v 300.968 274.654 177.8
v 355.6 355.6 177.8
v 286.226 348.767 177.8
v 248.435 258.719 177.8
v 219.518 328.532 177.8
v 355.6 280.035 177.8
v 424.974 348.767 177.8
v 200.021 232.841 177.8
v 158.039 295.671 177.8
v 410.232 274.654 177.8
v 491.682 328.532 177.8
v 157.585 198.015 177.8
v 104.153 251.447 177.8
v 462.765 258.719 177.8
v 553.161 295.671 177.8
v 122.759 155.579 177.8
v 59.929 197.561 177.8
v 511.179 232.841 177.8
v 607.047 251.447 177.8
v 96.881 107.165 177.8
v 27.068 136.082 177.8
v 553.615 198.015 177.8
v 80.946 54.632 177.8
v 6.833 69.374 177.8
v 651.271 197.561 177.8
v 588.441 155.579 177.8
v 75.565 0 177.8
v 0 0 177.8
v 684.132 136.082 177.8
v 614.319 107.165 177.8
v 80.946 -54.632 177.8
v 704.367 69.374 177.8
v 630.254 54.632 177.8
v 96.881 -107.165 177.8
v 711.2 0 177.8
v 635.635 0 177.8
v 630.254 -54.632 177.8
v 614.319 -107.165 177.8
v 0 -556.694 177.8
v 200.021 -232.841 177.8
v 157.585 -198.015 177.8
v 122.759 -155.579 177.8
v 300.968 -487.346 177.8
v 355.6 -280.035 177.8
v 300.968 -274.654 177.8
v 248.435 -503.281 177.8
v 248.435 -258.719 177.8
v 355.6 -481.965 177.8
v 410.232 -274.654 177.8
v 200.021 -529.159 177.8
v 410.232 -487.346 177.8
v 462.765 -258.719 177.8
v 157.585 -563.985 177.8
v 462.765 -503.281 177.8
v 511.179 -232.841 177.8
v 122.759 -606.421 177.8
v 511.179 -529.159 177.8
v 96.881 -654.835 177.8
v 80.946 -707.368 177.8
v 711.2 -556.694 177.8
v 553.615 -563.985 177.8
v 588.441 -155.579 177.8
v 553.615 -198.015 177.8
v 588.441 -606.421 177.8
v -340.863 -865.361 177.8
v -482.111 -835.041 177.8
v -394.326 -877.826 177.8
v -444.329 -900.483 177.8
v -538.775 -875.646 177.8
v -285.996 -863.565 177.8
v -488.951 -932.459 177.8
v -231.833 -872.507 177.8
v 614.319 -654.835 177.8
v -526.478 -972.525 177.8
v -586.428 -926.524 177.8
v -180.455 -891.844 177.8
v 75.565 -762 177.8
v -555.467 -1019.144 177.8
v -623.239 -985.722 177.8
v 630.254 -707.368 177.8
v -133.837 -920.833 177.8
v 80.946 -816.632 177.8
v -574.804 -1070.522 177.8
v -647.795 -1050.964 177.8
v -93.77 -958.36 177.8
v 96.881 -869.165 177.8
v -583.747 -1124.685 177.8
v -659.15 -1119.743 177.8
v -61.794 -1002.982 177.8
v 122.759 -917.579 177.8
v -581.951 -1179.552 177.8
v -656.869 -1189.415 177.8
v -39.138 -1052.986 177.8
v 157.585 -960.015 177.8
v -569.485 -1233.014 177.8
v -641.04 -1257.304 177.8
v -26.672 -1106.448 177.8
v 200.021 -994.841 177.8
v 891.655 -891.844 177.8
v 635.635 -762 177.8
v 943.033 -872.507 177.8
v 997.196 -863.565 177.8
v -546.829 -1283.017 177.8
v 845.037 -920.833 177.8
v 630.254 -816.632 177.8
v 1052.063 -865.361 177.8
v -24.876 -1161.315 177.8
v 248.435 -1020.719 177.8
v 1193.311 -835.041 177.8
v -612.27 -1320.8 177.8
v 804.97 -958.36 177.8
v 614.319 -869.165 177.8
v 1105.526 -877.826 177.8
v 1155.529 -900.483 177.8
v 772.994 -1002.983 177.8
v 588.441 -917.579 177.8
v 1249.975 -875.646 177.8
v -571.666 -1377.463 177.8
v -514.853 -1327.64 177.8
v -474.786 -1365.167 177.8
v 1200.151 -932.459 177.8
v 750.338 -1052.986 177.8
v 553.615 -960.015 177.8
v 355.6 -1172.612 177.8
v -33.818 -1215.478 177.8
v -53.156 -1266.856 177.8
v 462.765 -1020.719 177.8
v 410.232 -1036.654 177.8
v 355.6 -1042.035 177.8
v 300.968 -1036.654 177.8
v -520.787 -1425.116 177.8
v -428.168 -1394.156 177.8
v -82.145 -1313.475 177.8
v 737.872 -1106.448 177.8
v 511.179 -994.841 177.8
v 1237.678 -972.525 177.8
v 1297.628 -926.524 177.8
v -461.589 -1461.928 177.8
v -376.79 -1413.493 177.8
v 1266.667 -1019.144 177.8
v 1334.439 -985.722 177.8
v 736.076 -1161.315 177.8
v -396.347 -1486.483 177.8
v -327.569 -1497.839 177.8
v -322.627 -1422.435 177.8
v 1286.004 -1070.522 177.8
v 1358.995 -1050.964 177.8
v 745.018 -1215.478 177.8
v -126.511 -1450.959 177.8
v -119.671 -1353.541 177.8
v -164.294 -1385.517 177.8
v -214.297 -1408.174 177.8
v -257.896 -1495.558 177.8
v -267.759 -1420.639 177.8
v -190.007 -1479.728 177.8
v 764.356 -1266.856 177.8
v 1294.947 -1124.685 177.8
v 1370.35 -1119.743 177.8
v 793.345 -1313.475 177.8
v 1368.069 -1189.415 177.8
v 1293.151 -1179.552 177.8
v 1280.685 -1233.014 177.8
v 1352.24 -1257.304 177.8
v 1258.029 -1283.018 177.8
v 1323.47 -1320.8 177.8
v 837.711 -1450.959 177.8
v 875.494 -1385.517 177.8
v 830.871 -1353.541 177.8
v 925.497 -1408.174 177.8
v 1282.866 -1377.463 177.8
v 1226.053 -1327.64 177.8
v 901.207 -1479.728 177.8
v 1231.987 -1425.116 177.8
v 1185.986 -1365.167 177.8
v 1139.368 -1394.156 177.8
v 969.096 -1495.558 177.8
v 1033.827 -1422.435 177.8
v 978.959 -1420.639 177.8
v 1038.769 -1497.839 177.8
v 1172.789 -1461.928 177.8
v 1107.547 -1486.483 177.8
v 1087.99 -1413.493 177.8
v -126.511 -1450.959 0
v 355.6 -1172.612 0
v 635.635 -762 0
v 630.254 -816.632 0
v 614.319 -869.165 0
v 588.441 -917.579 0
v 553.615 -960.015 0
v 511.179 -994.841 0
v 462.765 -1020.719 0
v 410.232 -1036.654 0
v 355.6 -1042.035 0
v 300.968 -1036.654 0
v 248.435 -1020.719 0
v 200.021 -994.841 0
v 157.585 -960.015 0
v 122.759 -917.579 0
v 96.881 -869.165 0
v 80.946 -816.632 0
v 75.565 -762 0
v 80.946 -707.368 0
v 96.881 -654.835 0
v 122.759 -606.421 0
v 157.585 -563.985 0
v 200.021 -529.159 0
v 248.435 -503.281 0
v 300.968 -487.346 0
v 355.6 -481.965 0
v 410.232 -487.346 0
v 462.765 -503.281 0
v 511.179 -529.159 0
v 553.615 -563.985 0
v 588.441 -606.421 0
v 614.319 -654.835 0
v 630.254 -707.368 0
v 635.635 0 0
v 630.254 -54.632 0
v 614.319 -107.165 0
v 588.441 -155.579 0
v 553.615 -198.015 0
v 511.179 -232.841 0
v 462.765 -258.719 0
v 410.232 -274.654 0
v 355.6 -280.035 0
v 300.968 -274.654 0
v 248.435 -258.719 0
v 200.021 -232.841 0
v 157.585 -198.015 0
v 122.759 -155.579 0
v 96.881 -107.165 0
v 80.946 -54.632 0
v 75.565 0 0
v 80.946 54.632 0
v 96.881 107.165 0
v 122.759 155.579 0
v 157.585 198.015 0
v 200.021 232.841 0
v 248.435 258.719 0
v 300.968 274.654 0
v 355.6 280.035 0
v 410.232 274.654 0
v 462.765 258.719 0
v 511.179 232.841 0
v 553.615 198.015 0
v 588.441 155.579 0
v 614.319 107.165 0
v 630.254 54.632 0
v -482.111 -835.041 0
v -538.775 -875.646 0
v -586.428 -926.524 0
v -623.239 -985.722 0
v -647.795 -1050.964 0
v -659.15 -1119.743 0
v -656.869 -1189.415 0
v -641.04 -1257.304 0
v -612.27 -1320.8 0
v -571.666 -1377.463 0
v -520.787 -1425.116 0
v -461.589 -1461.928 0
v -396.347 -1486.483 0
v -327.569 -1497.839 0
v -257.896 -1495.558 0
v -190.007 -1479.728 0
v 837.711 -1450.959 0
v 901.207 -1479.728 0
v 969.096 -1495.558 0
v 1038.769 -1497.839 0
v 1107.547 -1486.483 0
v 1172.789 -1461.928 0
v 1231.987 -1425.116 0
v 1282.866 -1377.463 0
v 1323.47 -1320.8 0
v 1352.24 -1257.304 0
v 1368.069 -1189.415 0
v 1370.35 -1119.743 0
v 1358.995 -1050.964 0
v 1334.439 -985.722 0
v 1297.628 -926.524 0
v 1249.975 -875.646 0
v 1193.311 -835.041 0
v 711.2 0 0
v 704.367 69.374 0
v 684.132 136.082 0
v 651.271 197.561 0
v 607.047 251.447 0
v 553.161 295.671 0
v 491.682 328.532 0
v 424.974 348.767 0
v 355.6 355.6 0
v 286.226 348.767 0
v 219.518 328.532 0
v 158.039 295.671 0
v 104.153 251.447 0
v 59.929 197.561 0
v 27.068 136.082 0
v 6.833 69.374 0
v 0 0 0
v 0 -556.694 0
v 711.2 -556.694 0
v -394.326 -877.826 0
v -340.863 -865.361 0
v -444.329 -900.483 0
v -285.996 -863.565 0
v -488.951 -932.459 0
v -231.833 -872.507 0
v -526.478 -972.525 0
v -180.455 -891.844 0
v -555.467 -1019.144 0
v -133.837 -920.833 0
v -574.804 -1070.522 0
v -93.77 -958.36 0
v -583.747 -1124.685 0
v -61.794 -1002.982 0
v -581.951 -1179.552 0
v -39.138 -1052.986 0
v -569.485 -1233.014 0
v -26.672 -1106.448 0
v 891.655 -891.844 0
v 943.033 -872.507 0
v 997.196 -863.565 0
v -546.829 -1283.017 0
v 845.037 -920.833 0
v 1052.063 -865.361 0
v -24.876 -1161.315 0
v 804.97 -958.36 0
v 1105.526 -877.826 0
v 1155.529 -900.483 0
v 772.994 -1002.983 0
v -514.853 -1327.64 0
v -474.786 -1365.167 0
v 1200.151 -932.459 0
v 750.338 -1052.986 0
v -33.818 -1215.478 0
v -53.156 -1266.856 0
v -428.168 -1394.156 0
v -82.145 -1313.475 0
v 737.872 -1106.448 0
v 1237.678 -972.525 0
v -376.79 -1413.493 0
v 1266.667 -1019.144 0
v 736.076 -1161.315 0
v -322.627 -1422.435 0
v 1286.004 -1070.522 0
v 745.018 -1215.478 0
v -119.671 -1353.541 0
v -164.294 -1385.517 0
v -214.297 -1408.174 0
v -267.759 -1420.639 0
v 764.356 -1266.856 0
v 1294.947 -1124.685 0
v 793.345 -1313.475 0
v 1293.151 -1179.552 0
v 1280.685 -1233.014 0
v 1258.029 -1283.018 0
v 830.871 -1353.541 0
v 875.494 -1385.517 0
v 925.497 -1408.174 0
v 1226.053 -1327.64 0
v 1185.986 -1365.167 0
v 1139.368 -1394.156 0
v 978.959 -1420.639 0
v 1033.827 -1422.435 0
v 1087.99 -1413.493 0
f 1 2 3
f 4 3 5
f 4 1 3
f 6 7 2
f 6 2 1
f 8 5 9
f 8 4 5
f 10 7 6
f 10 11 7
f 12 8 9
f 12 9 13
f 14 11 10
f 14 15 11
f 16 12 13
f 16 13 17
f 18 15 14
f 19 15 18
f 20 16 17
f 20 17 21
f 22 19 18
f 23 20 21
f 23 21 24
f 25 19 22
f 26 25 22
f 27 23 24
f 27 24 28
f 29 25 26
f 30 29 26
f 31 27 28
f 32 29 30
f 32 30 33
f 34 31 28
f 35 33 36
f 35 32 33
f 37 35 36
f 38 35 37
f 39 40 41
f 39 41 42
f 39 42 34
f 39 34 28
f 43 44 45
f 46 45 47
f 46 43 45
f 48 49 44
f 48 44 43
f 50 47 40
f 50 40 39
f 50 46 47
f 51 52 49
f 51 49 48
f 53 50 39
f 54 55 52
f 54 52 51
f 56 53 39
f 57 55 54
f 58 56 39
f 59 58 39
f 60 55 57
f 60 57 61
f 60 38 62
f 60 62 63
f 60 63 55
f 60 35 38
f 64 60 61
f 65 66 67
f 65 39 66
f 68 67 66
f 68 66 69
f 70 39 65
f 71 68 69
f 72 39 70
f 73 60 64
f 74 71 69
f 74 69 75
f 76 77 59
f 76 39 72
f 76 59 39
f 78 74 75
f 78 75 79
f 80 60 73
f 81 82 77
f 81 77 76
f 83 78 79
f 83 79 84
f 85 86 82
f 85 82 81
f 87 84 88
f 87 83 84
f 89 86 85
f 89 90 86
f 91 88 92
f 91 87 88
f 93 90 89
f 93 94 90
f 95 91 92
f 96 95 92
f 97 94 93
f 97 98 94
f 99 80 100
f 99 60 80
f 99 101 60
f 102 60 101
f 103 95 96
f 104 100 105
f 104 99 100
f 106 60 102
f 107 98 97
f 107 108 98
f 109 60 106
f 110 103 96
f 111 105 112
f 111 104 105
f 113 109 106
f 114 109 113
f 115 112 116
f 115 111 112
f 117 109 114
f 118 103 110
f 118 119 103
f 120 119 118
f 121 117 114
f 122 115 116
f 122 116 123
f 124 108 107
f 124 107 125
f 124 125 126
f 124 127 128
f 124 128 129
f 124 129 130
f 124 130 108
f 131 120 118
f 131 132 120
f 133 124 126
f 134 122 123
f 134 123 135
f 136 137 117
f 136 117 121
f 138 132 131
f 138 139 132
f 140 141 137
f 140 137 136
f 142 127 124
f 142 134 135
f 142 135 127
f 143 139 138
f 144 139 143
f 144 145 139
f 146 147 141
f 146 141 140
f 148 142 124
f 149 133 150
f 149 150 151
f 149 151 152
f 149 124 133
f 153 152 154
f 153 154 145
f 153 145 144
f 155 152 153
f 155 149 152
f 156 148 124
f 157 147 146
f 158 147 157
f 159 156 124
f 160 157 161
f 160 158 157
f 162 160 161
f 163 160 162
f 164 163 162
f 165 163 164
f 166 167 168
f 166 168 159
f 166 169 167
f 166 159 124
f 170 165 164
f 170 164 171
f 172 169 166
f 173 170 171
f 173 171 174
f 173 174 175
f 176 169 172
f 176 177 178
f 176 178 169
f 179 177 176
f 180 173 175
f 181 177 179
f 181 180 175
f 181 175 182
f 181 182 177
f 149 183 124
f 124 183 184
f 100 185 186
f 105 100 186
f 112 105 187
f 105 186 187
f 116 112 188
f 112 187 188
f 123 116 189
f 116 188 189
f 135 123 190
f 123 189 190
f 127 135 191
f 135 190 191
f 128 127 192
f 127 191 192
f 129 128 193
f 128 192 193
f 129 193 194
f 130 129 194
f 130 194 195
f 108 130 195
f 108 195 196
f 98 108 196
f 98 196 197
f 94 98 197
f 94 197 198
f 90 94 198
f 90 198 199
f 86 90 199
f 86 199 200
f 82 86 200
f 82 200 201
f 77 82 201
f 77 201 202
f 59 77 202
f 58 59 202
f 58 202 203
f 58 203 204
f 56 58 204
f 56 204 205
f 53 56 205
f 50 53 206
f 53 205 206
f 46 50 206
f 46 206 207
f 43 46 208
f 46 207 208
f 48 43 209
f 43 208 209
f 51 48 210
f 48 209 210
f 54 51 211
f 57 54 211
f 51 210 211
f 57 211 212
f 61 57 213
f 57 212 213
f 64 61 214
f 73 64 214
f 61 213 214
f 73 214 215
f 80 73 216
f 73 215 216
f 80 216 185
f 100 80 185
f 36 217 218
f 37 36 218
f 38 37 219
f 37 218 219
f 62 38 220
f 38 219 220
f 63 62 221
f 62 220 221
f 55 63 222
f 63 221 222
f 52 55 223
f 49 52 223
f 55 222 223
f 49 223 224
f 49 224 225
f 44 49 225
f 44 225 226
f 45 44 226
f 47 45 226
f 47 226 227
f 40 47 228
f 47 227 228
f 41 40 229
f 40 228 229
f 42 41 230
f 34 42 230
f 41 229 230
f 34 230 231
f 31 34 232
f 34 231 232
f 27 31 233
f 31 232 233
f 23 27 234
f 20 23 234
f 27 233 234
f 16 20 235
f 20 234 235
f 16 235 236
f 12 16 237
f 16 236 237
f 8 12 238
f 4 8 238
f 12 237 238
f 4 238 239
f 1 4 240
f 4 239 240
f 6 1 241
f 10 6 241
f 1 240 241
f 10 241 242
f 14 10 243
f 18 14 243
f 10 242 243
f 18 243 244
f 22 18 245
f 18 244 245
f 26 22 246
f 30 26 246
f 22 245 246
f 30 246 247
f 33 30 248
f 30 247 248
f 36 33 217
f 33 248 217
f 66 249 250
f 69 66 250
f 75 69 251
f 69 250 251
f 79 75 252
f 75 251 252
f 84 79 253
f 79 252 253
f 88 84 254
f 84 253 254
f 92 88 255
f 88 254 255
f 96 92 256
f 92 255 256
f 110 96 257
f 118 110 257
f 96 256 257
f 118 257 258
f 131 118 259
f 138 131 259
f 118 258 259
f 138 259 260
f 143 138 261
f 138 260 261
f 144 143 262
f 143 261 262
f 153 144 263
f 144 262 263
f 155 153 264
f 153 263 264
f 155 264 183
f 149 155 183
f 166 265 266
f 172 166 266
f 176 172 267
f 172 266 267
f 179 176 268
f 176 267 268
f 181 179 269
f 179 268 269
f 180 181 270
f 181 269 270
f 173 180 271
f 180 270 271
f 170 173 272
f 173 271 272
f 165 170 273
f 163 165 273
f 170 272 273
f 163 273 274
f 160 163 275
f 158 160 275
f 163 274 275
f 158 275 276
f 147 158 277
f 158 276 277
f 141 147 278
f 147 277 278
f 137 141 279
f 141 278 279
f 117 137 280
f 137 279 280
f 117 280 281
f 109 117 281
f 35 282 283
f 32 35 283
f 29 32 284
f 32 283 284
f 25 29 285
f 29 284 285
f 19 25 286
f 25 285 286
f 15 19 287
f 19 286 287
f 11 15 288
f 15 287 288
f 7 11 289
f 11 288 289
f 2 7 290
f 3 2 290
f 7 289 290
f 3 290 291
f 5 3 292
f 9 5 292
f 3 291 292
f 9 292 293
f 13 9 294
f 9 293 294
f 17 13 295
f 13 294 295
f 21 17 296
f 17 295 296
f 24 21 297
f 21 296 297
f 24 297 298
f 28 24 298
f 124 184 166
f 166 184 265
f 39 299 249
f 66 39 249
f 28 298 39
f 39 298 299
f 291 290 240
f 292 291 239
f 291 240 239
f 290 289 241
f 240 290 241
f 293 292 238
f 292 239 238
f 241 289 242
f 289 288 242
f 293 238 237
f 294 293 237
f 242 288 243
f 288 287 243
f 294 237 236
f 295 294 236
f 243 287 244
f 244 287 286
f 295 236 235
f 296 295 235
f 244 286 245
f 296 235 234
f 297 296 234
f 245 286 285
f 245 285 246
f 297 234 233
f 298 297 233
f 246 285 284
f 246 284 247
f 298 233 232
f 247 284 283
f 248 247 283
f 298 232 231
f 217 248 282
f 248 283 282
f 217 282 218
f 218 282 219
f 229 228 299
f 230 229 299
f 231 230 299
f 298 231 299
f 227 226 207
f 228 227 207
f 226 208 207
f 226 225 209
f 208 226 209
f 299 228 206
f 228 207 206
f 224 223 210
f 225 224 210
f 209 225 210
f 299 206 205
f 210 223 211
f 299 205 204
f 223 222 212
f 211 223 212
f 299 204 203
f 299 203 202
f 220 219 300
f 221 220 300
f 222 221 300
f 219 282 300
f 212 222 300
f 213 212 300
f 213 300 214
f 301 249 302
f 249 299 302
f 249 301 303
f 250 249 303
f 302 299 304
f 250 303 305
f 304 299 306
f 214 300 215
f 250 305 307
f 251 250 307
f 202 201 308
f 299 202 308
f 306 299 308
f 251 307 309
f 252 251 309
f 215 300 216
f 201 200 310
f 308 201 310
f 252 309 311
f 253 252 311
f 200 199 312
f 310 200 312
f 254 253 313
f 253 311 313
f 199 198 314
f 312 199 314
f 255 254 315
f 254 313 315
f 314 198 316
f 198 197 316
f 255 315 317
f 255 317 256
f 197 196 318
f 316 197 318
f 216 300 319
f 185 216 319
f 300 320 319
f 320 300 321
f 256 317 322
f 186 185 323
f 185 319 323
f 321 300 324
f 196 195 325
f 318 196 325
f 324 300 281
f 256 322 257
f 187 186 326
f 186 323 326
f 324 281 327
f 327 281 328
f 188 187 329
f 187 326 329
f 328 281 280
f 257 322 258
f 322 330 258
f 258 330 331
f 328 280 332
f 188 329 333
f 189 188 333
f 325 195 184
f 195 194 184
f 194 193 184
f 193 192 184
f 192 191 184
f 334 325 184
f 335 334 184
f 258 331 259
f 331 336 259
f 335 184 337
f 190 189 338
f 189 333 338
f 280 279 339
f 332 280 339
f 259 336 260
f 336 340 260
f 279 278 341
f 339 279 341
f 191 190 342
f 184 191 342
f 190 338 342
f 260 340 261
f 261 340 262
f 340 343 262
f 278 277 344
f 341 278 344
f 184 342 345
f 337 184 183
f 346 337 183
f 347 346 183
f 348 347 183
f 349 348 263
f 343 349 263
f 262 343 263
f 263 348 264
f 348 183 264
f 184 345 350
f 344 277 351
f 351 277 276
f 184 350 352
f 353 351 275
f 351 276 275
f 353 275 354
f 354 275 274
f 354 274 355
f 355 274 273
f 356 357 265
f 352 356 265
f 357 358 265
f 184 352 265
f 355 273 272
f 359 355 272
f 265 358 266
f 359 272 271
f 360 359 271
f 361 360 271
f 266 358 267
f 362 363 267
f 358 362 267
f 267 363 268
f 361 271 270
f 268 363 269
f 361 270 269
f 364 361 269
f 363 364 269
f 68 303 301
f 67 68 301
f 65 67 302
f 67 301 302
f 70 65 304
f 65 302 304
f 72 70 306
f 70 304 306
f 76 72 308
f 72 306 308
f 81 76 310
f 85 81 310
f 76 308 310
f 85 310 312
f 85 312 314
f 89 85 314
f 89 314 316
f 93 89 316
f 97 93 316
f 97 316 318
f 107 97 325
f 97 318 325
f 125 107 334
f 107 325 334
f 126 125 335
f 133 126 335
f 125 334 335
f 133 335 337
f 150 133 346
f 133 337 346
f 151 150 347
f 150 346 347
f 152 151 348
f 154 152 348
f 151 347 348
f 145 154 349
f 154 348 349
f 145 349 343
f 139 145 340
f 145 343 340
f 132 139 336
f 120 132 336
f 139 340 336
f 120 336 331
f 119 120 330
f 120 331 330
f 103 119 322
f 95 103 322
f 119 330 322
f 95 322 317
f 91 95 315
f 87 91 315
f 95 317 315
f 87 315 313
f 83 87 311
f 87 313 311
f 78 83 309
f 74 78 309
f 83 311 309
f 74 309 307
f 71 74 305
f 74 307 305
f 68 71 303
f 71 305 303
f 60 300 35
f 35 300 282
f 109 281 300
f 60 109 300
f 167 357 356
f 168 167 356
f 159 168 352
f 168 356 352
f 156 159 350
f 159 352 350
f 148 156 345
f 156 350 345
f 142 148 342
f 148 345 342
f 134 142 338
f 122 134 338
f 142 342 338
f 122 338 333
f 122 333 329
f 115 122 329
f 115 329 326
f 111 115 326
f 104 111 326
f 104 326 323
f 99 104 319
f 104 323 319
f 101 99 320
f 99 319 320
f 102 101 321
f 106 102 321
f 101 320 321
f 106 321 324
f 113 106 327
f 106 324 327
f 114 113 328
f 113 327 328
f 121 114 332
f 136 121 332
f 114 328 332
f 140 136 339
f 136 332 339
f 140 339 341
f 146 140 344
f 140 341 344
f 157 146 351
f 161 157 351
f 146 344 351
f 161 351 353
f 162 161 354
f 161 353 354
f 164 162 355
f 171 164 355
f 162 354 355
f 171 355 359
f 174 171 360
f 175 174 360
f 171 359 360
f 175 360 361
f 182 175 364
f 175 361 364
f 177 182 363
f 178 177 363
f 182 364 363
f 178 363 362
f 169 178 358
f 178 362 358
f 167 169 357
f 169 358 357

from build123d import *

# Parameters (mm, degrees)
F1_DEPTH        = 177.8
F1_COPIES_COUNT = 3


# Not quite as in the source:
# - a feature of the source that left no trace in its solid (it failed there, or was rolled back) is left out
# - a pattern or mirror of a feature is missing from the dataset's text; its kind, count and spacing are read off the source's solid


with BuildPart() as f1:
    # F0 (on Top) → F1 (new body)
    with BuildSketch(Plane.XY):
        with BuildLine():
            ThreePointArc((75.565, 0), (355.6, 280.035), (635.635, 0))
            Line((635.635, 0), (711.2, 0))
            ThreePointArc((711.2, 0), (355.6, 355.6), (0, 0))
            Line((0, 0), (75.565, 0))
        make_face()
        with BuildLine():
            Line((711.2, 0), (635.635, 0))
            ThreePointArc((635.635, 0), (355.6, -280.035), (75.565, 0))
            Line((75.565, 0), (0, 0))
            ThreePointArc((0, 0), (355.6, -355.6), (711.2, 0))
        make_face()
        with BuildLine():
            Line((711.2, -762), (711.2, 0))
            ThreePointArc((711.2, 0), (355.6, -355.6), (0, 0))
            Line((0, 0), (0, -762))
            ThreePointArc((0, -762), (355.6, -406.4), (711.2, -762))
        make_face()
        with BuildLine():
            ThreePointArc((0, -762), (355.6, -1117.6), (711.2, -762))
            Line((711.2, -762), (635.635, -762))
            ThreePointArc((635.635, -762), (355.6, -1042.035), (75.565, -762))
            Line((75.565, -762), (0, -762))
        make_face()
        with BuildLine():
            Line((635.635, -762), (711.2, -762))
            ThreePointArc((711.2, -762), (355.6, -406.4), (0, -762))
            Line((0, -762), (75.565, -762))
            ThreePointArc((75.565, -762), (355.6, -481.965), (635.635, -762))
        make_face()
    extrude(amount=F1_DEPTH)

    # F1_copies: F1 ×3 about axis
    f1_copies_axis = Axis((355.6, -762, 0), (0, 0, 1))


with BuildPart() as f1_1:
    add(f1.part)
    for i in range(1, F1_COPIES_COUNT):
        add(f1.part.rotate(f1_copies_axis, i * 360 / F1_COPIES_COUNT))


solid = f1_1.part
